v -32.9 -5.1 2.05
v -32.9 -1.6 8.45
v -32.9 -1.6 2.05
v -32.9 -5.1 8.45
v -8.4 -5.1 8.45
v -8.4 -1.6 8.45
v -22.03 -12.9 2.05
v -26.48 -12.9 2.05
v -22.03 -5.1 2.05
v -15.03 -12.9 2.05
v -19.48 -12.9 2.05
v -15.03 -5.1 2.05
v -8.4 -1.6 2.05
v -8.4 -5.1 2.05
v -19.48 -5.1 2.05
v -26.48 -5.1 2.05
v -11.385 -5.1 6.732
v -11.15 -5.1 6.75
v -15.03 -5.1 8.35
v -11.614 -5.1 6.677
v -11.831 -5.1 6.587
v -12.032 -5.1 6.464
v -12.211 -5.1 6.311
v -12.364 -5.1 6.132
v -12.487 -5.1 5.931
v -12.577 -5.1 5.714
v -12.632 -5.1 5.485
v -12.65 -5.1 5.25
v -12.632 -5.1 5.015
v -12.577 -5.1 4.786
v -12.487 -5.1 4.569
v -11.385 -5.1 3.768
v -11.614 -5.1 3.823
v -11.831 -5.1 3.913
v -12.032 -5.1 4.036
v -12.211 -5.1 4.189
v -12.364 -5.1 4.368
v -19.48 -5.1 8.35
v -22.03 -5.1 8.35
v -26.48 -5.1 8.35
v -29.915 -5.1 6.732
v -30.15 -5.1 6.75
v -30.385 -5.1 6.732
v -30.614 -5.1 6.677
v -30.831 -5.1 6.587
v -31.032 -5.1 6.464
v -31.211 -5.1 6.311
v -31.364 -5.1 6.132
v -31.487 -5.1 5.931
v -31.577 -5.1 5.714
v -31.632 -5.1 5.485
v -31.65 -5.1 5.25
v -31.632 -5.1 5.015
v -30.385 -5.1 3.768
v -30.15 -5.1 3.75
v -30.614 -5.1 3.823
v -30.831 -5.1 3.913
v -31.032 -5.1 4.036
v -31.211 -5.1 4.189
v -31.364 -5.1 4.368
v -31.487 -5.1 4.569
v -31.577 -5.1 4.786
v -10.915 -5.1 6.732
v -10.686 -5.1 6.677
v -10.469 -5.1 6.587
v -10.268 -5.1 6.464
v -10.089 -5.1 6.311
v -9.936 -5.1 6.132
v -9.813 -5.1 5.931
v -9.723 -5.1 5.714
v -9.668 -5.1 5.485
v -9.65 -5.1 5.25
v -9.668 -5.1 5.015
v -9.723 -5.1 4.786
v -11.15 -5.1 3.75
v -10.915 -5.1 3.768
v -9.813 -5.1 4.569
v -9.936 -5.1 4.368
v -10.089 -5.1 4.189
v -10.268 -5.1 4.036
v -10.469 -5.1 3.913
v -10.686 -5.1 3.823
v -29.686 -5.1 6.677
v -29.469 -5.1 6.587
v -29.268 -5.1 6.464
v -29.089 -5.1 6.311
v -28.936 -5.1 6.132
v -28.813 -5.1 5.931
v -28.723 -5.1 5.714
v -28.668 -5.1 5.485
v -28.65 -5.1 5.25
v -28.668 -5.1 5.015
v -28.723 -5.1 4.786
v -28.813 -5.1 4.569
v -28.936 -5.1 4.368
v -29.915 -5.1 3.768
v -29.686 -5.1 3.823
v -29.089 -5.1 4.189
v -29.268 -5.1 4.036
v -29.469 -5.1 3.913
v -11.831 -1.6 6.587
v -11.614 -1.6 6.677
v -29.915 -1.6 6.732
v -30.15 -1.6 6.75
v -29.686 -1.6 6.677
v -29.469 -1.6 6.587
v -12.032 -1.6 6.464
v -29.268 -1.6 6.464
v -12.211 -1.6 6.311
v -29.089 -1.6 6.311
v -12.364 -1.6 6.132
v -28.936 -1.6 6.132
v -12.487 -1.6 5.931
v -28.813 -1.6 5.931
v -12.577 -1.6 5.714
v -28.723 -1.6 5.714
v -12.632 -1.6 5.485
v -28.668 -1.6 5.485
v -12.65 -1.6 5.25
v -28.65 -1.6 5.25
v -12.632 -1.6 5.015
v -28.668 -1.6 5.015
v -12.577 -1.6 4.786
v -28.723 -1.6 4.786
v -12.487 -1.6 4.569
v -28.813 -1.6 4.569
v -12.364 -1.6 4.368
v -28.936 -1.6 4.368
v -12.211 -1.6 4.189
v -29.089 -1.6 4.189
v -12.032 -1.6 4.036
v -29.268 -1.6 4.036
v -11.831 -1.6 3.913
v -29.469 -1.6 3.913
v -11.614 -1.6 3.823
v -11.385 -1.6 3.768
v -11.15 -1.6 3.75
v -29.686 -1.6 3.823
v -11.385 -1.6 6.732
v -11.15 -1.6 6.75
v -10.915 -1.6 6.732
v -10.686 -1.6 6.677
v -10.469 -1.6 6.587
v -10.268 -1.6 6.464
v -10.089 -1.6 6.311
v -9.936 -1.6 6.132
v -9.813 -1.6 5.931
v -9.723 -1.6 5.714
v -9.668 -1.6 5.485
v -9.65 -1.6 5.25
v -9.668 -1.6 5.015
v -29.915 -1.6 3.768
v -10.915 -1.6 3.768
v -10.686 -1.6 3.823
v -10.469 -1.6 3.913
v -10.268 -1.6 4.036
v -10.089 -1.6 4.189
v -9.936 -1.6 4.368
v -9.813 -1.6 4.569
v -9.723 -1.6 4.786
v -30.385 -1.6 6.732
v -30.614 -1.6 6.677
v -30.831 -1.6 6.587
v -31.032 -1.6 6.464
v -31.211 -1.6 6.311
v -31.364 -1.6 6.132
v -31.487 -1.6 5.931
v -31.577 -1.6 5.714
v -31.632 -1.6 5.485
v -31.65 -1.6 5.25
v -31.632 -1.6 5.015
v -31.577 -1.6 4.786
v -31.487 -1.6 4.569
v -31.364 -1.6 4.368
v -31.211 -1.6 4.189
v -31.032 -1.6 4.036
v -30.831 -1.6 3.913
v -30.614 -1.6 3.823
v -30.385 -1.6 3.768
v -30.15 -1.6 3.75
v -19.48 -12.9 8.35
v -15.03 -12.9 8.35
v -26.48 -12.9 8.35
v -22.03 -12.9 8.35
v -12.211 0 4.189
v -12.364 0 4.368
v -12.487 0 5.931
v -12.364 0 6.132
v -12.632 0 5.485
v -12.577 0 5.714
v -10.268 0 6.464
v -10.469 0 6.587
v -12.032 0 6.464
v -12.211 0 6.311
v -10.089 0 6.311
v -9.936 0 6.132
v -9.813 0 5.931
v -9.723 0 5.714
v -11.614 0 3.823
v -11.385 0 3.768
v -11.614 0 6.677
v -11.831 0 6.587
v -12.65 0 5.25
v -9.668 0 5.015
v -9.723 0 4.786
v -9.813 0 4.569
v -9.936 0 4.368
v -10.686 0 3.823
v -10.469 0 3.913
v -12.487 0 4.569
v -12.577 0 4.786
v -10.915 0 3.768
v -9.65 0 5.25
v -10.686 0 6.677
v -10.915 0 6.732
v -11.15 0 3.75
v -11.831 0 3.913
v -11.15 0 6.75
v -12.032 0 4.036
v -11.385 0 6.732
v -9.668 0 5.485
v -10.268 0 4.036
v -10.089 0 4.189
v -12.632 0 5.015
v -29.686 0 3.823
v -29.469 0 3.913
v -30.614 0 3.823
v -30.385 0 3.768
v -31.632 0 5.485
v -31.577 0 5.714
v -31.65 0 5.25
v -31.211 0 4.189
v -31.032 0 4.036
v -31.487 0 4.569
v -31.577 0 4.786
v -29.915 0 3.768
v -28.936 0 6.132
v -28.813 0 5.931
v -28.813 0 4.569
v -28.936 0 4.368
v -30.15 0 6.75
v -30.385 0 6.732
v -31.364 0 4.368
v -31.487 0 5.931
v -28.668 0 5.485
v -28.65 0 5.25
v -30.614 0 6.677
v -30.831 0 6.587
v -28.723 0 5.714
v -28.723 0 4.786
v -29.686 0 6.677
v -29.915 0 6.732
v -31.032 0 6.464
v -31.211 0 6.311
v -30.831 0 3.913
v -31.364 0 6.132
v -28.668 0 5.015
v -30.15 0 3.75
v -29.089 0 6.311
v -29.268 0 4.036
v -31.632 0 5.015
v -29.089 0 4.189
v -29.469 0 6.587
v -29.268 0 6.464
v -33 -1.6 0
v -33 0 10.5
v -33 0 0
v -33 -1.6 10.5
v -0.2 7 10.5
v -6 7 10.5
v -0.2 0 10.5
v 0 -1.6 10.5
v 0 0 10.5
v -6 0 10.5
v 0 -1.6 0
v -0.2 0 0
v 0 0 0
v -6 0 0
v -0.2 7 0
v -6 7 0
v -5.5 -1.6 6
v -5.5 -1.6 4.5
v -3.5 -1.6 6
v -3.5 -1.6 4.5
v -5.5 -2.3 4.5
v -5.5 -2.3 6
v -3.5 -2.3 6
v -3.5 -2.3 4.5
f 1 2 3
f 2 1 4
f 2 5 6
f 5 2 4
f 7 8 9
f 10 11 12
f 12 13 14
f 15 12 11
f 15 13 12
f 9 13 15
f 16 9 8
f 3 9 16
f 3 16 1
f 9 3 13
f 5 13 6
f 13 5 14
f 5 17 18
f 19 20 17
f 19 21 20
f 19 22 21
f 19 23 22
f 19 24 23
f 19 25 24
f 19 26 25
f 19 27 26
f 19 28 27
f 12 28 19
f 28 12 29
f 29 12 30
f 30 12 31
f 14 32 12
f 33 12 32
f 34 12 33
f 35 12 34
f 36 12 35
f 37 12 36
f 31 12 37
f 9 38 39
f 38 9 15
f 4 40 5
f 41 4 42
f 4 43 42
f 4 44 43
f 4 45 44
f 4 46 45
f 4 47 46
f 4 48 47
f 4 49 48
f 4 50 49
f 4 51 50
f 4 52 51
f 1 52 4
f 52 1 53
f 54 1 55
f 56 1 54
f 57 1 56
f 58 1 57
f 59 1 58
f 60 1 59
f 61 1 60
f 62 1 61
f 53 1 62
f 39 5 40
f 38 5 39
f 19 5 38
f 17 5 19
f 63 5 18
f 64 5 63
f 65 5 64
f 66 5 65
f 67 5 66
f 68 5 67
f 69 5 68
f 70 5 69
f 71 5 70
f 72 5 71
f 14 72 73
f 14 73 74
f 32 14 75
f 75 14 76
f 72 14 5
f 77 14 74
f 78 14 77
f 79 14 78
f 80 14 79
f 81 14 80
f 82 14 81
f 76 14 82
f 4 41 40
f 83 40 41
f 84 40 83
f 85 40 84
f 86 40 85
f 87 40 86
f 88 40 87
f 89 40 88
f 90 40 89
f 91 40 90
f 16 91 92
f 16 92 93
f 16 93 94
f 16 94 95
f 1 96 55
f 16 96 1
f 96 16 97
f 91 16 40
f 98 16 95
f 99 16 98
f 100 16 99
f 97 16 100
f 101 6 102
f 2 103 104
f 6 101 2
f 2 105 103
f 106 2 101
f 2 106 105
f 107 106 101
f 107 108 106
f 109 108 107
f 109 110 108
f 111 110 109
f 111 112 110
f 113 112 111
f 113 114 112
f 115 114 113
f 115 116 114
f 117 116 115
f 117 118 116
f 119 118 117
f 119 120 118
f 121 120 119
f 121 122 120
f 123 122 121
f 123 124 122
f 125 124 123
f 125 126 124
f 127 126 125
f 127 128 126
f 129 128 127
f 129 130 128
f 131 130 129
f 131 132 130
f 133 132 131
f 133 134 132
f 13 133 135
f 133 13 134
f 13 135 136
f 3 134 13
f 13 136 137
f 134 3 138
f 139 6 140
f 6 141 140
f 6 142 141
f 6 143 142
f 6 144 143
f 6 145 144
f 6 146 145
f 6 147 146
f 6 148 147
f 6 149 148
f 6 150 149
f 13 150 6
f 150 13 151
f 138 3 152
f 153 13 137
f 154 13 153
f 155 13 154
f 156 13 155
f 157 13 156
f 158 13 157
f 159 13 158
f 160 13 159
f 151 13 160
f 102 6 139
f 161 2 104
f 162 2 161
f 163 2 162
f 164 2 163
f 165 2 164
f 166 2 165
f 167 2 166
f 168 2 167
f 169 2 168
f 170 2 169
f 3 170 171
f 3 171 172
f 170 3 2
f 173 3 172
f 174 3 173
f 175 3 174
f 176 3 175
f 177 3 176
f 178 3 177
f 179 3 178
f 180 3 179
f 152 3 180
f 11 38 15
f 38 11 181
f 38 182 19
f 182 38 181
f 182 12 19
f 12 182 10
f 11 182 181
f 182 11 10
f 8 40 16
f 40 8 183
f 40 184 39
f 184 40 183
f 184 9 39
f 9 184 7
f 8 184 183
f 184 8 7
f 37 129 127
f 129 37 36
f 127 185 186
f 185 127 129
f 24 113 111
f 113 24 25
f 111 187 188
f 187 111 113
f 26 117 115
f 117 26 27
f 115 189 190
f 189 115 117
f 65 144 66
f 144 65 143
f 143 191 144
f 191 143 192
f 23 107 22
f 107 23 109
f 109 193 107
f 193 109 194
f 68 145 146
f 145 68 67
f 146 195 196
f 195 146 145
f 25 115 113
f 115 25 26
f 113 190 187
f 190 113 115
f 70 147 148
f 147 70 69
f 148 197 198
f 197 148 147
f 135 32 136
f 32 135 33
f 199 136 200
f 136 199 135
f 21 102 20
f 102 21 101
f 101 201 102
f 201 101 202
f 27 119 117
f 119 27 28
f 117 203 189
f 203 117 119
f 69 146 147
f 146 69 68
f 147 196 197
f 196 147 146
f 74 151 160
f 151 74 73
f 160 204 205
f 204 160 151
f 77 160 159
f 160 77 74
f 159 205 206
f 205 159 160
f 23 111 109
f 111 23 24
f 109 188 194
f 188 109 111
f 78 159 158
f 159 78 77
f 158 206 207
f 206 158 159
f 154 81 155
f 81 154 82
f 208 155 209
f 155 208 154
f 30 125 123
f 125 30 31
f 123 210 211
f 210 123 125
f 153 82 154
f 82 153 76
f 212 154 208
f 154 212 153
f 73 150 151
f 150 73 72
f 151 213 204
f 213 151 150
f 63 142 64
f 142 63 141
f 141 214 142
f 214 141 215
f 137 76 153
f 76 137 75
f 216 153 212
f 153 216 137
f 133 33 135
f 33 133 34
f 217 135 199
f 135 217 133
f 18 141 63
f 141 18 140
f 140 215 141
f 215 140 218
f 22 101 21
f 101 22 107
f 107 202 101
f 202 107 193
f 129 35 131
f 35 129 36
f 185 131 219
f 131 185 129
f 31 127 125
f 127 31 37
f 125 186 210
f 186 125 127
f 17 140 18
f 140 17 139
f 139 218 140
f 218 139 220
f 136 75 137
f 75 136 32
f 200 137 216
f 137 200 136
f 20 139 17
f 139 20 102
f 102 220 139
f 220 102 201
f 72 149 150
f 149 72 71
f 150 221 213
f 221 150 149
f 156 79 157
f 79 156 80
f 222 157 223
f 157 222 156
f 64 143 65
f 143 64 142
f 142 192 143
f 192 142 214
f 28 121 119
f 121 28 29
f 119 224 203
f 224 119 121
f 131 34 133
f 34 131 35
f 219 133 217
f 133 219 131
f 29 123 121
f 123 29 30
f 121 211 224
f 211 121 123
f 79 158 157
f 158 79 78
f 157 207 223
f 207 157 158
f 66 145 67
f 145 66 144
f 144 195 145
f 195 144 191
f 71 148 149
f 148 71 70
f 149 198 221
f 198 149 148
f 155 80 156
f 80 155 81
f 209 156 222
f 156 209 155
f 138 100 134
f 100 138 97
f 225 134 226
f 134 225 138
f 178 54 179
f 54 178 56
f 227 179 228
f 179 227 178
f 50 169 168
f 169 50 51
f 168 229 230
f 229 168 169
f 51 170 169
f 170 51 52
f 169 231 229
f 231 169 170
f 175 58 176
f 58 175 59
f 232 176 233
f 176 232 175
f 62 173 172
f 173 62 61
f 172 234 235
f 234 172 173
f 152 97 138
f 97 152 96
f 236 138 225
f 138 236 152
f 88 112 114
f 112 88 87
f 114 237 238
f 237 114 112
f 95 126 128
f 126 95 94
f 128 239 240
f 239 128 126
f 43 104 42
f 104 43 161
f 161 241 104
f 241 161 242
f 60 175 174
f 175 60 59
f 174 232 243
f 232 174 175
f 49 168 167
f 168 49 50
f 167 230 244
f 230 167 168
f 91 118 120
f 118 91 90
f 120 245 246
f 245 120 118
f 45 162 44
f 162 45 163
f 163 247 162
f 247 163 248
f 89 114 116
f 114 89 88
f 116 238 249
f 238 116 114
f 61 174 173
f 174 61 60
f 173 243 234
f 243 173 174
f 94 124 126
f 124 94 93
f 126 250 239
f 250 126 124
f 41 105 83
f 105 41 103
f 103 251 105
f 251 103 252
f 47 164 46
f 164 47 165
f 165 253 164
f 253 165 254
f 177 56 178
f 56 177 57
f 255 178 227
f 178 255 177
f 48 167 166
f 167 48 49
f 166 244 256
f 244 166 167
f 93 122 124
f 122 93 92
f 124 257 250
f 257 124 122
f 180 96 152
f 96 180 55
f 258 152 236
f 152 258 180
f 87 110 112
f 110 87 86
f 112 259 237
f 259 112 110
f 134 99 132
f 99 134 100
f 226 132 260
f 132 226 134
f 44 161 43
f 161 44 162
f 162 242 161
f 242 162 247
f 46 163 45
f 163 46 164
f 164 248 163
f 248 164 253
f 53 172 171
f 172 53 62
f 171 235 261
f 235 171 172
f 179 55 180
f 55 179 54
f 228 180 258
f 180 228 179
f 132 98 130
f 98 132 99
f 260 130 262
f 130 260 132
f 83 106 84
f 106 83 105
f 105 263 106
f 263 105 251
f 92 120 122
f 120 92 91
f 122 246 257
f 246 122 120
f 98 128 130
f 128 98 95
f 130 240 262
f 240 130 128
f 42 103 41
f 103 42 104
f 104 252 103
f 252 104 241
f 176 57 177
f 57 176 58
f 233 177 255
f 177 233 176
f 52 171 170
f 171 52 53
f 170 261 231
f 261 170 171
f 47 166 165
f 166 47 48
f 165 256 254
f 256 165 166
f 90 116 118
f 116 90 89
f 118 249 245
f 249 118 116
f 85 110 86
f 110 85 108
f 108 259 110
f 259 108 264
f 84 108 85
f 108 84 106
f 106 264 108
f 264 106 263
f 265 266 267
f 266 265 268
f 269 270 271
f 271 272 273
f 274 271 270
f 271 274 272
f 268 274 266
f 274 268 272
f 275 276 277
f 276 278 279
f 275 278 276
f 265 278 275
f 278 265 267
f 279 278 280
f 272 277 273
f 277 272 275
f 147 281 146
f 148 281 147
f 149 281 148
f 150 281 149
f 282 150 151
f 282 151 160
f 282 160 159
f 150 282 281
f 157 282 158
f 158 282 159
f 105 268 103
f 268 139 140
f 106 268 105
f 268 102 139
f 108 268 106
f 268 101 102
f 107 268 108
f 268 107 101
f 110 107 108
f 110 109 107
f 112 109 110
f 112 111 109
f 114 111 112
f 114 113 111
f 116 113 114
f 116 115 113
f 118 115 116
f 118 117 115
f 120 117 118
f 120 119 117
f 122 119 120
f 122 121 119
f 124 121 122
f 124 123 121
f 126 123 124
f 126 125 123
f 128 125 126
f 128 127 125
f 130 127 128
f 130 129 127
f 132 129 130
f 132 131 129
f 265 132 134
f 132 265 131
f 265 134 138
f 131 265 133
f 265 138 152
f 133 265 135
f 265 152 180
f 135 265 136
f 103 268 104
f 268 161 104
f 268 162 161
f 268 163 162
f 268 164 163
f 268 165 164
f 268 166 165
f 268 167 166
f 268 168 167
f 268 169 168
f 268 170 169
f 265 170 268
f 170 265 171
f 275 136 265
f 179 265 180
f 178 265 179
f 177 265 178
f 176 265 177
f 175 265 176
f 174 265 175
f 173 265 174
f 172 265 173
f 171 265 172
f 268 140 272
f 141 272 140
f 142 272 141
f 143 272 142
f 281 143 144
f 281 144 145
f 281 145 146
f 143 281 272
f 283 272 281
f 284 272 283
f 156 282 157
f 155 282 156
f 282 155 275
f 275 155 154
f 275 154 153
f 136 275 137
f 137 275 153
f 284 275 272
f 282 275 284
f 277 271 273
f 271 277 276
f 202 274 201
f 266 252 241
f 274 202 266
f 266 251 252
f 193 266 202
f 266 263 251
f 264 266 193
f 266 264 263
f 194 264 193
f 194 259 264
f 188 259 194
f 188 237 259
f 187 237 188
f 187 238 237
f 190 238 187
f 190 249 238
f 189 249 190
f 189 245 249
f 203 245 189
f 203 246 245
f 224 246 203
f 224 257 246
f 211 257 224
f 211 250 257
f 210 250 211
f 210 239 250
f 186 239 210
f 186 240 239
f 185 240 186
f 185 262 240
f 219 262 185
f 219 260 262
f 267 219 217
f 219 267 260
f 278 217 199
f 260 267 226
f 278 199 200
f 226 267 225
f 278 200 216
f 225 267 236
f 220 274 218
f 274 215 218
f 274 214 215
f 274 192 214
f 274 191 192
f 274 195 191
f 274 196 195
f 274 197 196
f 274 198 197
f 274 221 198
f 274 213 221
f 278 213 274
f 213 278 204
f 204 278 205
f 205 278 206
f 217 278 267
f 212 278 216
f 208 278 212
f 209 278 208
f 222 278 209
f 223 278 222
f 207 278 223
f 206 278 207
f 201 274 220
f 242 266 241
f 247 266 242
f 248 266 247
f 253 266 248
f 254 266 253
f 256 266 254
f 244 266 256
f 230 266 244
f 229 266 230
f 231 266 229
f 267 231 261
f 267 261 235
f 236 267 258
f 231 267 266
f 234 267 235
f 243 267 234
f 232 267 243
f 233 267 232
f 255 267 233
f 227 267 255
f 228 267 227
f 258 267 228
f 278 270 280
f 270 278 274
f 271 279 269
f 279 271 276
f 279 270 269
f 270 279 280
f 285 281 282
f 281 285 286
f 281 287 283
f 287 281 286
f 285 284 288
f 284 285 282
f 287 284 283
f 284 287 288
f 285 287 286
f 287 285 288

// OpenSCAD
rotate ([0,0,180]) opto_endstop();


module opto_endstop(){
 difference(){
  union(){
  // base PCB
   color("green") cube([33.0,1.6,10.5]);
  // add the switch module
   translate([8.4,1.6,10.5/2-6.4/2]) optoswitch();
   // connector
   translate([0.2,-7,0]) color("white") cube([5.8,7,10.5]);
   // led
   translate([3.5,1.6,10.5/2-1.5/2]) color("red") cube([2,0.7,1.5]);
  }
   translate([8.4,0,10.5/2-6.4/2]) {
   for ( hole = [2.75,24.5-2.75] ){
    rotate([90,0,0]) translate([hole,6.4/2,-4]) cylinder(r=1.5, h=4.5,$fn=40);
   }
  }
 }
}

// switch module
module optoswitch() {
 difference(){
  union (){
   color("gray") cube([24.5,3.5,6.4]);
   color("gray")translate([6.63,0,0]) cube([4.45,11.3,6.3]);
   color("gray")translate([13.63,0,0]) cube([4.45,11.3,6.3]);
  }
   for ( hole = [2.75,24.5-2.75] ){
 	rotate([90,0,0]) translate([hole,6.4/2,-4]) cylinder(r=1.5, h=4.5,$fn=40);
   }	
 }
}
